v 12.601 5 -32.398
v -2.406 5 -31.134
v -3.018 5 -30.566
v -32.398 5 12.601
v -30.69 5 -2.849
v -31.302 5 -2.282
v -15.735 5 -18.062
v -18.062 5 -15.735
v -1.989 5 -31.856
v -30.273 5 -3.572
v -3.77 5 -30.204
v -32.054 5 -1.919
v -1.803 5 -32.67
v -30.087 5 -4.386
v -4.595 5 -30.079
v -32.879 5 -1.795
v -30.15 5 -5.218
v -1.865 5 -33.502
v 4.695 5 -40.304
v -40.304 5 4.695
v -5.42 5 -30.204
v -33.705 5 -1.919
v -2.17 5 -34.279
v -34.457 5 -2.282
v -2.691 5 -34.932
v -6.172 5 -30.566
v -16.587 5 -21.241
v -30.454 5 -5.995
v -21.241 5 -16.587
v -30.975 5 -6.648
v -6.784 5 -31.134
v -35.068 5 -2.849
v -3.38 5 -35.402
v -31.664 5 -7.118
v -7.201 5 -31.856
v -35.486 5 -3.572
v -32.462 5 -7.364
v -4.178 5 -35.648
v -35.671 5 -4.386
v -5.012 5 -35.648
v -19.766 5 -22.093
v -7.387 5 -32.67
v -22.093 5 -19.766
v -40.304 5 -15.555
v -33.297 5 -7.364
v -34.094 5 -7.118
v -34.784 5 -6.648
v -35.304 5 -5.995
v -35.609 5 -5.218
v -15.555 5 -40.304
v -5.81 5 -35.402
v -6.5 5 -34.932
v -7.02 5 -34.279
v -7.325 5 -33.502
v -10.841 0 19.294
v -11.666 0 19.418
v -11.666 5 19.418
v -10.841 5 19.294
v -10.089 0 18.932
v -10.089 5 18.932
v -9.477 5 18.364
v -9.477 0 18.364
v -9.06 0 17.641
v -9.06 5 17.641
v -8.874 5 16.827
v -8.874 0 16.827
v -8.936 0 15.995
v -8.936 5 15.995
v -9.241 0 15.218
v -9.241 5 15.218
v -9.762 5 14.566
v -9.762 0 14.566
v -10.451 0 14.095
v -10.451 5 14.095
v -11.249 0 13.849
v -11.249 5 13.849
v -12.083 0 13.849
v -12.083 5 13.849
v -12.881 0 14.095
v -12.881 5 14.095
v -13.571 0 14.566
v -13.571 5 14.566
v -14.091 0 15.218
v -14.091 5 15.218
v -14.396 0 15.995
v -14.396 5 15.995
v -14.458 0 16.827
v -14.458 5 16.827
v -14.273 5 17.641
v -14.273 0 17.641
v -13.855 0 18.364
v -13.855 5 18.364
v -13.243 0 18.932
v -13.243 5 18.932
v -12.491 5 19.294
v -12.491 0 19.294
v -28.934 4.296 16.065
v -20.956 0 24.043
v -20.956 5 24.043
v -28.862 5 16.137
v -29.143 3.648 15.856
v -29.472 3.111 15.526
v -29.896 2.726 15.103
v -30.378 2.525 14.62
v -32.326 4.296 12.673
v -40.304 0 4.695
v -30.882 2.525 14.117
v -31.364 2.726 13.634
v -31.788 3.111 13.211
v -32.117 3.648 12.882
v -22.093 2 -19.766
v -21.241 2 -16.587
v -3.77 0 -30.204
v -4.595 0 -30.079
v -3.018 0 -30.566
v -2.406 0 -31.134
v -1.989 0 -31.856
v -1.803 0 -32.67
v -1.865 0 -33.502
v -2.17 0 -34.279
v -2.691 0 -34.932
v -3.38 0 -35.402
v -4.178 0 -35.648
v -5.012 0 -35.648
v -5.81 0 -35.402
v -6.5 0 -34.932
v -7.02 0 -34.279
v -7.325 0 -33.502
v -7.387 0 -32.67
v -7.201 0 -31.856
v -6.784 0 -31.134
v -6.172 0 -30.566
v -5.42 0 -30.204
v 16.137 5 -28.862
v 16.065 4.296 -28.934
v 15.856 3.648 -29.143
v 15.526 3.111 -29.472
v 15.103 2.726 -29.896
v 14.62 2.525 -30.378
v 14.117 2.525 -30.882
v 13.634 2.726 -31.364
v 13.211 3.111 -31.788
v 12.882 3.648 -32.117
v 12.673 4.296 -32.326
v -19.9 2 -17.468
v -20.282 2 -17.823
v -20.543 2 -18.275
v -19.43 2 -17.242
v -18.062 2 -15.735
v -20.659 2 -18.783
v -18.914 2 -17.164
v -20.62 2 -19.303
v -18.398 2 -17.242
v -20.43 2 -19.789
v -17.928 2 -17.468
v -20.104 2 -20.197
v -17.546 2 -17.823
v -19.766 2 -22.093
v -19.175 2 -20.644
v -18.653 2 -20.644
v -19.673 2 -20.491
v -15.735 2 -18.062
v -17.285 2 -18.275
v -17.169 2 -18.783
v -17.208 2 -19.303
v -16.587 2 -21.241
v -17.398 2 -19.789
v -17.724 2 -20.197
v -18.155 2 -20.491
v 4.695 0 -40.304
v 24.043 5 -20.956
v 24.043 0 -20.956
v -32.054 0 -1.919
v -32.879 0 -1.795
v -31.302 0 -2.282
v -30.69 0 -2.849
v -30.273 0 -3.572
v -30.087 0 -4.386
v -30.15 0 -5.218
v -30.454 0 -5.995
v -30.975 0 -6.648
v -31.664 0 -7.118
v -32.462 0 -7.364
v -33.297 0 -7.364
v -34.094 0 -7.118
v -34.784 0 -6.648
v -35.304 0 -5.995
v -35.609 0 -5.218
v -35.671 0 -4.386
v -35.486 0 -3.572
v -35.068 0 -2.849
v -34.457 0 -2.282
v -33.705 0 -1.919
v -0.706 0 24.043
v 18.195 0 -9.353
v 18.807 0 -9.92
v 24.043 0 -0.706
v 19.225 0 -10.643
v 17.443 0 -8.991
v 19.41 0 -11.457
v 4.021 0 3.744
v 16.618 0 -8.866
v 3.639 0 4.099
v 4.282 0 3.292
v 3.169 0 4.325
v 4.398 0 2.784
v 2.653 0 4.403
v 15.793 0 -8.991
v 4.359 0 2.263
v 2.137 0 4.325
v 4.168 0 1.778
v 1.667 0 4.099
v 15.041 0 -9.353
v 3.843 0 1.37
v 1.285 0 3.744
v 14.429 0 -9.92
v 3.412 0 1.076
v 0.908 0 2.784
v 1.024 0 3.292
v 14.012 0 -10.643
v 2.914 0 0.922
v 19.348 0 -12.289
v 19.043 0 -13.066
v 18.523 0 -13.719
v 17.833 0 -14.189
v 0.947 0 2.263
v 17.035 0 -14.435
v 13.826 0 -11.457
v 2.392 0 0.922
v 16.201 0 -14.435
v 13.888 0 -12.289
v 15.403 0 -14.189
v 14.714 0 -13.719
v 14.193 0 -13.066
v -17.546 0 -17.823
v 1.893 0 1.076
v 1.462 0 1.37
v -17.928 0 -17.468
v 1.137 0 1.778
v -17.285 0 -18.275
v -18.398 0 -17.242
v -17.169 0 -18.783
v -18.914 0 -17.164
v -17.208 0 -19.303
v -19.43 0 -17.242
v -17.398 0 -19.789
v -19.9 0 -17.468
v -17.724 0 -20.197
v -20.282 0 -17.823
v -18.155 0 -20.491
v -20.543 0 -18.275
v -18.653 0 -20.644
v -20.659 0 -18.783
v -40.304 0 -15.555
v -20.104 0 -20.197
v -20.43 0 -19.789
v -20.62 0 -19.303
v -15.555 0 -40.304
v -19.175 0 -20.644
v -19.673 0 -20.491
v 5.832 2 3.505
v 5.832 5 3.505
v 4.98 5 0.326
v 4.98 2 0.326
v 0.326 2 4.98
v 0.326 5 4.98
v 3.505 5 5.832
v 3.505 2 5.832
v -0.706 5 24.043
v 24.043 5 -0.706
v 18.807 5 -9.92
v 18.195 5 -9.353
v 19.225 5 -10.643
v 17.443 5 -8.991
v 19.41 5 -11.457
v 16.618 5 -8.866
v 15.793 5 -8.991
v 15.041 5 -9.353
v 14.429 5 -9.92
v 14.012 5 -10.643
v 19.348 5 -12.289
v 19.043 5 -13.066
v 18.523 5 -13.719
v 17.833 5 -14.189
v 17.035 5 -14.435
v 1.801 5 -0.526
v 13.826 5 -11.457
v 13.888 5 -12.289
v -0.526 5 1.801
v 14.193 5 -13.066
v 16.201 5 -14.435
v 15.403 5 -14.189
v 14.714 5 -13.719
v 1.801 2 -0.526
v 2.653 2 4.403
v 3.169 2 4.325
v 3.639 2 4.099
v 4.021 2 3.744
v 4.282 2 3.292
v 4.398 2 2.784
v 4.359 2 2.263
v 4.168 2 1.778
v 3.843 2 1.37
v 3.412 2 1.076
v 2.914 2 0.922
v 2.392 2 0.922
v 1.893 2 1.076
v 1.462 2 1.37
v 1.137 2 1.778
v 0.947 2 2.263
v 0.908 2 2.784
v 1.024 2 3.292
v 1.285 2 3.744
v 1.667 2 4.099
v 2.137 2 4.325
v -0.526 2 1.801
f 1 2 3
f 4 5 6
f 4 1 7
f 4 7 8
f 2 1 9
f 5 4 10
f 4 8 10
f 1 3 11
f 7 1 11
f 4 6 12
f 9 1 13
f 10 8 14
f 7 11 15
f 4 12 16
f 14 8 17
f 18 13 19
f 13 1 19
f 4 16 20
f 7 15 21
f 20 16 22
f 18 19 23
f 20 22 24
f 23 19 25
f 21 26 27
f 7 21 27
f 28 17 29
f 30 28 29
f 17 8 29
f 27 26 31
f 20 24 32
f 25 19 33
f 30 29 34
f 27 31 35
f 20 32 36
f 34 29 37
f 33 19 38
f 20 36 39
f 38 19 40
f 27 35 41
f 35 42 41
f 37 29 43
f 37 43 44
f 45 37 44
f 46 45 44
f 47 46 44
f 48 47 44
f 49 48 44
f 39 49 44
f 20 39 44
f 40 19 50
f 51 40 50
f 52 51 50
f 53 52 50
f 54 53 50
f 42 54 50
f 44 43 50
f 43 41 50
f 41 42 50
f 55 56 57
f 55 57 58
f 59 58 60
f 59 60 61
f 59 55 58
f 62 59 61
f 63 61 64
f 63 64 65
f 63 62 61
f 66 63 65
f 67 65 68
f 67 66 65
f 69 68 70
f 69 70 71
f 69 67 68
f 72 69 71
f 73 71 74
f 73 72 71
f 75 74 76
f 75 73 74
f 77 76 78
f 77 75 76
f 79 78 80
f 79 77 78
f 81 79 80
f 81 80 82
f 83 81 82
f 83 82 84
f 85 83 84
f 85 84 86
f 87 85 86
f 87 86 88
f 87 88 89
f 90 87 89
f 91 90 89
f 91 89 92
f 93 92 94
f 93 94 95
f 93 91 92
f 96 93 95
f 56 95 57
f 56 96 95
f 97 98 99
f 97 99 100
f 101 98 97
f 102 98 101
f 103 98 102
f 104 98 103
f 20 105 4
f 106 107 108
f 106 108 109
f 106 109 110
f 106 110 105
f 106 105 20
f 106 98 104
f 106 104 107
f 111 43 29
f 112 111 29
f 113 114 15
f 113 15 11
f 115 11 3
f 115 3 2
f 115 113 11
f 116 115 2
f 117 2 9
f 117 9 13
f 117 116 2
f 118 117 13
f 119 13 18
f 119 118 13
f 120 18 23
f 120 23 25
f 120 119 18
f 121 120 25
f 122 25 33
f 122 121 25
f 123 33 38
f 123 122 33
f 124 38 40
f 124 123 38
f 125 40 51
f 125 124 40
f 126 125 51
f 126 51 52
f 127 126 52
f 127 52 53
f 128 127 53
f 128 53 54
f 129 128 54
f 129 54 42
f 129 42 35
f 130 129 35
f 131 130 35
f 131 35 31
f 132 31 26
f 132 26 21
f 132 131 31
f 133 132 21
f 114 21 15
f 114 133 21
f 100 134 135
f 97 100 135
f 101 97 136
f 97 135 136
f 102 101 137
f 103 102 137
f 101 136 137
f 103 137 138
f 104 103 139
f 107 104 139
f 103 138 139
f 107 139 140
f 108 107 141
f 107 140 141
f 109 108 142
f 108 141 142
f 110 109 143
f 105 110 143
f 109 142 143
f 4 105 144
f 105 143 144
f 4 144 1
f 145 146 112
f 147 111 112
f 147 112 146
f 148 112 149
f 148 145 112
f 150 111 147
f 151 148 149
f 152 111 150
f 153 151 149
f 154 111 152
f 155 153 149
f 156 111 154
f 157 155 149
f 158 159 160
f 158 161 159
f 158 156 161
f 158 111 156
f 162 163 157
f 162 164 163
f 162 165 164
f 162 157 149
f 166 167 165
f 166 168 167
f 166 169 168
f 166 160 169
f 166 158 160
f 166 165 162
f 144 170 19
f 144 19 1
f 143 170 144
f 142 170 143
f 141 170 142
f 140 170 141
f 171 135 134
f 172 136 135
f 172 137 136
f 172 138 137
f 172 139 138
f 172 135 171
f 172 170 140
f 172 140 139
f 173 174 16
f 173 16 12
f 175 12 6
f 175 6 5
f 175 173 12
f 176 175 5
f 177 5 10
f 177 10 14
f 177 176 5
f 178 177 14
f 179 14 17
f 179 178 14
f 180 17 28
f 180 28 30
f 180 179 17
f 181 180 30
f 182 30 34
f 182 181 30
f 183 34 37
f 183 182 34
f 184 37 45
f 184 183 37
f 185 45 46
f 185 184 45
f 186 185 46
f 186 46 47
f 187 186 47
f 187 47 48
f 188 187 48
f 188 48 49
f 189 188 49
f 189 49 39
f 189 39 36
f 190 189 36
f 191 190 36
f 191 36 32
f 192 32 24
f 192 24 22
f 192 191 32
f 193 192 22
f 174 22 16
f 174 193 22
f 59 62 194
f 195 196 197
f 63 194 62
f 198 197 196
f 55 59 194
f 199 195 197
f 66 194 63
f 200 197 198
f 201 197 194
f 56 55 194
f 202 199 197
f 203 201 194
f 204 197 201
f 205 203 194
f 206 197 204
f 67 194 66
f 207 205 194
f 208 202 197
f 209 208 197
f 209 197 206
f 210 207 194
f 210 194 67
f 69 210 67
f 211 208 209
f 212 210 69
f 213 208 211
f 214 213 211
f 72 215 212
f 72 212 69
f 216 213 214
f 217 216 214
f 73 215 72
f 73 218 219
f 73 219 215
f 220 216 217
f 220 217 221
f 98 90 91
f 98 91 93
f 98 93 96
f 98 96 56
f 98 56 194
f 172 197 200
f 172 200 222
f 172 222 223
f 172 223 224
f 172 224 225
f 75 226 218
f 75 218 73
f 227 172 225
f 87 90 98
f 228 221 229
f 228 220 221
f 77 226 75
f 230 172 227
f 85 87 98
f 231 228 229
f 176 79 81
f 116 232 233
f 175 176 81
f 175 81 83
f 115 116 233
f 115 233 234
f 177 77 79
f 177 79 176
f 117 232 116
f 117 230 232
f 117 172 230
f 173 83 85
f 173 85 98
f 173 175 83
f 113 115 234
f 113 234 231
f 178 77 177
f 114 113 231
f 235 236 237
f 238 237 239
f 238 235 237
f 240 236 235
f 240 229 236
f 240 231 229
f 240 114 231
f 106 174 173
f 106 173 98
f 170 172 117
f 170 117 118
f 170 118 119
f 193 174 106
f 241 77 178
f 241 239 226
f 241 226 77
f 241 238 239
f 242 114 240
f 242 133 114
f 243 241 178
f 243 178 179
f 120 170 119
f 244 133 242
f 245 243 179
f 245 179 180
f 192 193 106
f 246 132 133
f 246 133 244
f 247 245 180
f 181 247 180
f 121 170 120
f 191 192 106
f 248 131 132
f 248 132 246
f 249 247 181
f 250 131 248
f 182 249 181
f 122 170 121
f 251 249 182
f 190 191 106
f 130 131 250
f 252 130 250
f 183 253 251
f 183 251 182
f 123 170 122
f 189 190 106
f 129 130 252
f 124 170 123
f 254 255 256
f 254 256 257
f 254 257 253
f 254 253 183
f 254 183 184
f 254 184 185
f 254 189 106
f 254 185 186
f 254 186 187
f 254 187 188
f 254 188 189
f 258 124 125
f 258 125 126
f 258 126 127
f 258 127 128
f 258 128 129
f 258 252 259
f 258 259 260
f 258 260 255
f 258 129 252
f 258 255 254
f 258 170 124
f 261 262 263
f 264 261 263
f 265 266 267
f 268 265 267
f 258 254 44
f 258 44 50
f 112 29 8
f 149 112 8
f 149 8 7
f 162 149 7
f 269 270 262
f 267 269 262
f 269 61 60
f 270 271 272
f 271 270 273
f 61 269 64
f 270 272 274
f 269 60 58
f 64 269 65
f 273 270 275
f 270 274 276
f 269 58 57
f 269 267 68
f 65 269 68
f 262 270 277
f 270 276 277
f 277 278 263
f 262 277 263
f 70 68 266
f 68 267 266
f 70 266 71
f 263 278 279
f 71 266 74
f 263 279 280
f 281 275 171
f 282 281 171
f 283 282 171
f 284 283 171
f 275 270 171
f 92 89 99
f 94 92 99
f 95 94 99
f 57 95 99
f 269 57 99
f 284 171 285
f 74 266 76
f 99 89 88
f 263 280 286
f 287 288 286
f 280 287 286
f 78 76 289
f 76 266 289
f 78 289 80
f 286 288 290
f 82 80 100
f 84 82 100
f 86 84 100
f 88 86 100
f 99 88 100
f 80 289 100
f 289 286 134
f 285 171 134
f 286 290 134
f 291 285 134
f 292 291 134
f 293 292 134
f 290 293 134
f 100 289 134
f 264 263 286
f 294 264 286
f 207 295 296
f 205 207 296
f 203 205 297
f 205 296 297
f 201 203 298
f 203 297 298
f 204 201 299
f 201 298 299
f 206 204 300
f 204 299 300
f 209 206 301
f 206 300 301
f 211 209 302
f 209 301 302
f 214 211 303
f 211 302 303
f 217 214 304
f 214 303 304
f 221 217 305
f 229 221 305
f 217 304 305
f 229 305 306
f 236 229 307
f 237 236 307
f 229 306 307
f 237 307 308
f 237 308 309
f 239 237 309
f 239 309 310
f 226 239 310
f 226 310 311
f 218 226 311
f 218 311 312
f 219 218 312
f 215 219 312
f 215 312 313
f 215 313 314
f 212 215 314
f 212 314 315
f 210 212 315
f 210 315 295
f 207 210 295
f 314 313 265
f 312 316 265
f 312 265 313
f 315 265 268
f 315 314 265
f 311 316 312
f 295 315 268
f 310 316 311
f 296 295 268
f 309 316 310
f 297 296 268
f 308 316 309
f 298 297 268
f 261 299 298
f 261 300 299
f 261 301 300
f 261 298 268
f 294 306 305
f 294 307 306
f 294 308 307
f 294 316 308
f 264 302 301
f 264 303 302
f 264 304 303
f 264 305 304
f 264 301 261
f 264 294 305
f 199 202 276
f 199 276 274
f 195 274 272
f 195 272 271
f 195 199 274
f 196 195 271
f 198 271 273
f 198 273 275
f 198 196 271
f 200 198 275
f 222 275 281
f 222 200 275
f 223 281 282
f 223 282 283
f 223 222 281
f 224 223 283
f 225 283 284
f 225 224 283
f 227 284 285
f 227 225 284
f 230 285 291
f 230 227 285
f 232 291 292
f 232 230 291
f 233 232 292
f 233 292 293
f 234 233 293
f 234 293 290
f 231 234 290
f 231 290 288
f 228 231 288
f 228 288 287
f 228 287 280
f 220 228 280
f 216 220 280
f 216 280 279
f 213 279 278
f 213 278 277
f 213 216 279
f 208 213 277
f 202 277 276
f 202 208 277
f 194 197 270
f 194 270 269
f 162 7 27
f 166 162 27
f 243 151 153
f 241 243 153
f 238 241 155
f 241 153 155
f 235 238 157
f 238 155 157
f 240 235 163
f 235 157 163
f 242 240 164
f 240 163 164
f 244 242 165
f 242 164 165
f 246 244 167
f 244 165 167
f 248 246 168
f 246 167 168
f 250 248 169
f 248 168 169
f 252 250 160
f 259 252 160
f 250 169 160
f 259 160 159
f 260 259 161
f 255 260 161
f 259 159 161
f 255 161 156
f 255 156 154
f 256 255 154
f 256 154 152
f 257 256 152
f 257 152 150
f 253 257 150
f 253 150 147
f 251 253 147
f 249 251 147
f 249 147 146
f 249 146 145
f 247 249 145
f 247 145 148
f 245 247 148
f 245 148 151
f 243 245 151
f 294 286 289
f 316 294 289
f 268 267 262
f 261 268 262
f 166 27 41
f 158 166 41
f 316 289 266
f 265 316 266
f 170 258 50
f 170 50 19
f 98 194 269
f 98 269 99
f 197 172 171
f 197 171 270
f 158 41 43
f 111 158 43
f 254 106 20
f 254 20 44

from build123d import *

# Parameters (mm, degrees)
SKETCH1_R           = 2.8
BOSS_EXTRUDE1_DEPTH = 5
CUT_EXTRUDE1_REACH  = 80.329
CUT_EXTRUDE2_DEPTH  = 3
CUT_EXTRUDE3_REACH  = 59.217
SKETCH6_R           = 1.75


with BuildPart() as part:
    # Sketch1 → Boss-Extrude1 (new body)
    with BuildSketch(Plane(origin=(0, 0, 0), x_dir=(1, 0, 0), z_dir=(0, 1, 0))):
        Polygon((-40.303943114, 15.555205773), (-15.555205773, 40.303943114), (4.694794227, 40.303943114), (24.042773974, 20.955963368), (24.042773974, 0.705963368), (-0.705963368, -24.042773974), (-20.955963368, -24.042773974), (-40.303943114, -4.694794227), align=None)
        with Locations(Location((-11.666118476, -16.618152771, 0), (0, 0, 270))):
            Circle(SKETCH1_R, mode=Mode.SUBTRACT)
        with Locations(Location((16.618152771, 11.666118476, 0), (0, 0, 270))):
            Circle(SKETCH1_R, mode=Mode.SUBTRACT)
        with Locations(Location((-4.595050664, 32.879321912, 0), (0, 0, 270))):
            Circle(SKETCH1_R, mode=Mode.SUBTRACT)
        with Locations(Location((-32.879321912, 4.595050664, 0), (0, 0, 270))):
            Circle(SKETCH1_R, mode=Mode.SUBTRACT)
    extrude(amount=BOSS_EXTRUDE1_DEPTH)

    # Sketch4 → Cut-Extrude1 (cut, up to next)
    with BuildSketch(Plane(origin=(22.499368671, 0, -22.499368671), x_dir=(-0.7071067811865465, 0, -0.7071067811865487), z_dir=(0.7071067811865487, 0, -0.7071067811865465)), mode=Mode.PRIVATE) as cut_extrude1_sk1:
        with BuildLine():
            Line((13.998382969, 5), (8.998382969, 5))
            ThreePointArc((8.998382969, 5), (11.498382969, 2.5), (13.998382969, 5))
        make_face()
    cut_extrude1_tool1 = extrude(cut_extrude1_sk1.sketch, amount=-CUT_EXTRUDE1_REACH, mode=Mode.PRIVATE) & part.part
    add(cut_extrude1_tool1.solids().sort_by_distance((14.368784, 3.938967, -30.629953))[0], mode=Mode.SUBTRACT)

    # Sketch5 → Cut-Extrude2 (cut)
    with BuildSketch(Plane(origin=(0, 5, 0), x_dir=(1, 0, 0), z_dir=(0, 1, 0))):
        Polygon((-16.586947728, 21.240978239), (-19.765709682, 22.092724938), (-22.092724938, 19.765709682), (-21.240978239, 16.586947728), (-18.062216285, 15.735201029), (-15.735201029, 18.062216285), align=None)
        Polygon((4.979809098, -0.325778587), (1.801047144, 0.525968112), (-0.525968112, -1.801047144), (0.325778587, -4.979809098), (3.504540541, -5.831555797), (5.831555797, -3.504540541), align=None)
    extrude(amount=-CUT_EXTRUDE2_DEPTH, mode=Mode.SUBTRACT)

    # Sketch6 → Cut-Extrude3 (cut, up to next)
    with BuildSketch(Plane(origin=(0, 5, 0), x_dir=(1, 0, 0), z_dir=(0, 1, 0)), mode=Mode.PRIVATE) as cut_extrude3_sk1:
        with Locations(Location((-18.913962984, 18.913962984, 0), (0, 0, 270))):
            Circle(SKETCH6_R)
    cut_extrude3_tool1 = extrude(cut_extrude3_sk1.sketch, amount=-CUT_EXTRUDE3_REACH, mode=Mode.PRIVATE) & part.part
    # Sketch6 → Cut-Extrude3 (cut, up to next)
    with BuildSketch(Plane(origin=(0, 5, 0), x_dir=(1, 0, 0), z_dir=(0, 1, 0)), mode=Mode.PRIVATE) as cut_extrude3_sk2:
        with Locations(Location((2.652793843, -2.652793843, 0), (0, 0, 270))):
            Circle(SKETCH6_R)
    cut_extrude3_tool2 = extrude(cut_extrude3_sk2.sketch, amount=-CUT_EXTRUDE3_REACH, mode=Mode.PRIVATE) & part.part
    add(cut_extrude3_tool1.solids().sort_by_distance((-18.913963, 5, -18.913963))[0], mode=Mode.SUBTRACT)
    add(cut_extrude3_tool2.solids().sort_by_distance((2.652794, 5, 2.652794))[0], mode=Mode.SUBTRACT)


solid = part.part
